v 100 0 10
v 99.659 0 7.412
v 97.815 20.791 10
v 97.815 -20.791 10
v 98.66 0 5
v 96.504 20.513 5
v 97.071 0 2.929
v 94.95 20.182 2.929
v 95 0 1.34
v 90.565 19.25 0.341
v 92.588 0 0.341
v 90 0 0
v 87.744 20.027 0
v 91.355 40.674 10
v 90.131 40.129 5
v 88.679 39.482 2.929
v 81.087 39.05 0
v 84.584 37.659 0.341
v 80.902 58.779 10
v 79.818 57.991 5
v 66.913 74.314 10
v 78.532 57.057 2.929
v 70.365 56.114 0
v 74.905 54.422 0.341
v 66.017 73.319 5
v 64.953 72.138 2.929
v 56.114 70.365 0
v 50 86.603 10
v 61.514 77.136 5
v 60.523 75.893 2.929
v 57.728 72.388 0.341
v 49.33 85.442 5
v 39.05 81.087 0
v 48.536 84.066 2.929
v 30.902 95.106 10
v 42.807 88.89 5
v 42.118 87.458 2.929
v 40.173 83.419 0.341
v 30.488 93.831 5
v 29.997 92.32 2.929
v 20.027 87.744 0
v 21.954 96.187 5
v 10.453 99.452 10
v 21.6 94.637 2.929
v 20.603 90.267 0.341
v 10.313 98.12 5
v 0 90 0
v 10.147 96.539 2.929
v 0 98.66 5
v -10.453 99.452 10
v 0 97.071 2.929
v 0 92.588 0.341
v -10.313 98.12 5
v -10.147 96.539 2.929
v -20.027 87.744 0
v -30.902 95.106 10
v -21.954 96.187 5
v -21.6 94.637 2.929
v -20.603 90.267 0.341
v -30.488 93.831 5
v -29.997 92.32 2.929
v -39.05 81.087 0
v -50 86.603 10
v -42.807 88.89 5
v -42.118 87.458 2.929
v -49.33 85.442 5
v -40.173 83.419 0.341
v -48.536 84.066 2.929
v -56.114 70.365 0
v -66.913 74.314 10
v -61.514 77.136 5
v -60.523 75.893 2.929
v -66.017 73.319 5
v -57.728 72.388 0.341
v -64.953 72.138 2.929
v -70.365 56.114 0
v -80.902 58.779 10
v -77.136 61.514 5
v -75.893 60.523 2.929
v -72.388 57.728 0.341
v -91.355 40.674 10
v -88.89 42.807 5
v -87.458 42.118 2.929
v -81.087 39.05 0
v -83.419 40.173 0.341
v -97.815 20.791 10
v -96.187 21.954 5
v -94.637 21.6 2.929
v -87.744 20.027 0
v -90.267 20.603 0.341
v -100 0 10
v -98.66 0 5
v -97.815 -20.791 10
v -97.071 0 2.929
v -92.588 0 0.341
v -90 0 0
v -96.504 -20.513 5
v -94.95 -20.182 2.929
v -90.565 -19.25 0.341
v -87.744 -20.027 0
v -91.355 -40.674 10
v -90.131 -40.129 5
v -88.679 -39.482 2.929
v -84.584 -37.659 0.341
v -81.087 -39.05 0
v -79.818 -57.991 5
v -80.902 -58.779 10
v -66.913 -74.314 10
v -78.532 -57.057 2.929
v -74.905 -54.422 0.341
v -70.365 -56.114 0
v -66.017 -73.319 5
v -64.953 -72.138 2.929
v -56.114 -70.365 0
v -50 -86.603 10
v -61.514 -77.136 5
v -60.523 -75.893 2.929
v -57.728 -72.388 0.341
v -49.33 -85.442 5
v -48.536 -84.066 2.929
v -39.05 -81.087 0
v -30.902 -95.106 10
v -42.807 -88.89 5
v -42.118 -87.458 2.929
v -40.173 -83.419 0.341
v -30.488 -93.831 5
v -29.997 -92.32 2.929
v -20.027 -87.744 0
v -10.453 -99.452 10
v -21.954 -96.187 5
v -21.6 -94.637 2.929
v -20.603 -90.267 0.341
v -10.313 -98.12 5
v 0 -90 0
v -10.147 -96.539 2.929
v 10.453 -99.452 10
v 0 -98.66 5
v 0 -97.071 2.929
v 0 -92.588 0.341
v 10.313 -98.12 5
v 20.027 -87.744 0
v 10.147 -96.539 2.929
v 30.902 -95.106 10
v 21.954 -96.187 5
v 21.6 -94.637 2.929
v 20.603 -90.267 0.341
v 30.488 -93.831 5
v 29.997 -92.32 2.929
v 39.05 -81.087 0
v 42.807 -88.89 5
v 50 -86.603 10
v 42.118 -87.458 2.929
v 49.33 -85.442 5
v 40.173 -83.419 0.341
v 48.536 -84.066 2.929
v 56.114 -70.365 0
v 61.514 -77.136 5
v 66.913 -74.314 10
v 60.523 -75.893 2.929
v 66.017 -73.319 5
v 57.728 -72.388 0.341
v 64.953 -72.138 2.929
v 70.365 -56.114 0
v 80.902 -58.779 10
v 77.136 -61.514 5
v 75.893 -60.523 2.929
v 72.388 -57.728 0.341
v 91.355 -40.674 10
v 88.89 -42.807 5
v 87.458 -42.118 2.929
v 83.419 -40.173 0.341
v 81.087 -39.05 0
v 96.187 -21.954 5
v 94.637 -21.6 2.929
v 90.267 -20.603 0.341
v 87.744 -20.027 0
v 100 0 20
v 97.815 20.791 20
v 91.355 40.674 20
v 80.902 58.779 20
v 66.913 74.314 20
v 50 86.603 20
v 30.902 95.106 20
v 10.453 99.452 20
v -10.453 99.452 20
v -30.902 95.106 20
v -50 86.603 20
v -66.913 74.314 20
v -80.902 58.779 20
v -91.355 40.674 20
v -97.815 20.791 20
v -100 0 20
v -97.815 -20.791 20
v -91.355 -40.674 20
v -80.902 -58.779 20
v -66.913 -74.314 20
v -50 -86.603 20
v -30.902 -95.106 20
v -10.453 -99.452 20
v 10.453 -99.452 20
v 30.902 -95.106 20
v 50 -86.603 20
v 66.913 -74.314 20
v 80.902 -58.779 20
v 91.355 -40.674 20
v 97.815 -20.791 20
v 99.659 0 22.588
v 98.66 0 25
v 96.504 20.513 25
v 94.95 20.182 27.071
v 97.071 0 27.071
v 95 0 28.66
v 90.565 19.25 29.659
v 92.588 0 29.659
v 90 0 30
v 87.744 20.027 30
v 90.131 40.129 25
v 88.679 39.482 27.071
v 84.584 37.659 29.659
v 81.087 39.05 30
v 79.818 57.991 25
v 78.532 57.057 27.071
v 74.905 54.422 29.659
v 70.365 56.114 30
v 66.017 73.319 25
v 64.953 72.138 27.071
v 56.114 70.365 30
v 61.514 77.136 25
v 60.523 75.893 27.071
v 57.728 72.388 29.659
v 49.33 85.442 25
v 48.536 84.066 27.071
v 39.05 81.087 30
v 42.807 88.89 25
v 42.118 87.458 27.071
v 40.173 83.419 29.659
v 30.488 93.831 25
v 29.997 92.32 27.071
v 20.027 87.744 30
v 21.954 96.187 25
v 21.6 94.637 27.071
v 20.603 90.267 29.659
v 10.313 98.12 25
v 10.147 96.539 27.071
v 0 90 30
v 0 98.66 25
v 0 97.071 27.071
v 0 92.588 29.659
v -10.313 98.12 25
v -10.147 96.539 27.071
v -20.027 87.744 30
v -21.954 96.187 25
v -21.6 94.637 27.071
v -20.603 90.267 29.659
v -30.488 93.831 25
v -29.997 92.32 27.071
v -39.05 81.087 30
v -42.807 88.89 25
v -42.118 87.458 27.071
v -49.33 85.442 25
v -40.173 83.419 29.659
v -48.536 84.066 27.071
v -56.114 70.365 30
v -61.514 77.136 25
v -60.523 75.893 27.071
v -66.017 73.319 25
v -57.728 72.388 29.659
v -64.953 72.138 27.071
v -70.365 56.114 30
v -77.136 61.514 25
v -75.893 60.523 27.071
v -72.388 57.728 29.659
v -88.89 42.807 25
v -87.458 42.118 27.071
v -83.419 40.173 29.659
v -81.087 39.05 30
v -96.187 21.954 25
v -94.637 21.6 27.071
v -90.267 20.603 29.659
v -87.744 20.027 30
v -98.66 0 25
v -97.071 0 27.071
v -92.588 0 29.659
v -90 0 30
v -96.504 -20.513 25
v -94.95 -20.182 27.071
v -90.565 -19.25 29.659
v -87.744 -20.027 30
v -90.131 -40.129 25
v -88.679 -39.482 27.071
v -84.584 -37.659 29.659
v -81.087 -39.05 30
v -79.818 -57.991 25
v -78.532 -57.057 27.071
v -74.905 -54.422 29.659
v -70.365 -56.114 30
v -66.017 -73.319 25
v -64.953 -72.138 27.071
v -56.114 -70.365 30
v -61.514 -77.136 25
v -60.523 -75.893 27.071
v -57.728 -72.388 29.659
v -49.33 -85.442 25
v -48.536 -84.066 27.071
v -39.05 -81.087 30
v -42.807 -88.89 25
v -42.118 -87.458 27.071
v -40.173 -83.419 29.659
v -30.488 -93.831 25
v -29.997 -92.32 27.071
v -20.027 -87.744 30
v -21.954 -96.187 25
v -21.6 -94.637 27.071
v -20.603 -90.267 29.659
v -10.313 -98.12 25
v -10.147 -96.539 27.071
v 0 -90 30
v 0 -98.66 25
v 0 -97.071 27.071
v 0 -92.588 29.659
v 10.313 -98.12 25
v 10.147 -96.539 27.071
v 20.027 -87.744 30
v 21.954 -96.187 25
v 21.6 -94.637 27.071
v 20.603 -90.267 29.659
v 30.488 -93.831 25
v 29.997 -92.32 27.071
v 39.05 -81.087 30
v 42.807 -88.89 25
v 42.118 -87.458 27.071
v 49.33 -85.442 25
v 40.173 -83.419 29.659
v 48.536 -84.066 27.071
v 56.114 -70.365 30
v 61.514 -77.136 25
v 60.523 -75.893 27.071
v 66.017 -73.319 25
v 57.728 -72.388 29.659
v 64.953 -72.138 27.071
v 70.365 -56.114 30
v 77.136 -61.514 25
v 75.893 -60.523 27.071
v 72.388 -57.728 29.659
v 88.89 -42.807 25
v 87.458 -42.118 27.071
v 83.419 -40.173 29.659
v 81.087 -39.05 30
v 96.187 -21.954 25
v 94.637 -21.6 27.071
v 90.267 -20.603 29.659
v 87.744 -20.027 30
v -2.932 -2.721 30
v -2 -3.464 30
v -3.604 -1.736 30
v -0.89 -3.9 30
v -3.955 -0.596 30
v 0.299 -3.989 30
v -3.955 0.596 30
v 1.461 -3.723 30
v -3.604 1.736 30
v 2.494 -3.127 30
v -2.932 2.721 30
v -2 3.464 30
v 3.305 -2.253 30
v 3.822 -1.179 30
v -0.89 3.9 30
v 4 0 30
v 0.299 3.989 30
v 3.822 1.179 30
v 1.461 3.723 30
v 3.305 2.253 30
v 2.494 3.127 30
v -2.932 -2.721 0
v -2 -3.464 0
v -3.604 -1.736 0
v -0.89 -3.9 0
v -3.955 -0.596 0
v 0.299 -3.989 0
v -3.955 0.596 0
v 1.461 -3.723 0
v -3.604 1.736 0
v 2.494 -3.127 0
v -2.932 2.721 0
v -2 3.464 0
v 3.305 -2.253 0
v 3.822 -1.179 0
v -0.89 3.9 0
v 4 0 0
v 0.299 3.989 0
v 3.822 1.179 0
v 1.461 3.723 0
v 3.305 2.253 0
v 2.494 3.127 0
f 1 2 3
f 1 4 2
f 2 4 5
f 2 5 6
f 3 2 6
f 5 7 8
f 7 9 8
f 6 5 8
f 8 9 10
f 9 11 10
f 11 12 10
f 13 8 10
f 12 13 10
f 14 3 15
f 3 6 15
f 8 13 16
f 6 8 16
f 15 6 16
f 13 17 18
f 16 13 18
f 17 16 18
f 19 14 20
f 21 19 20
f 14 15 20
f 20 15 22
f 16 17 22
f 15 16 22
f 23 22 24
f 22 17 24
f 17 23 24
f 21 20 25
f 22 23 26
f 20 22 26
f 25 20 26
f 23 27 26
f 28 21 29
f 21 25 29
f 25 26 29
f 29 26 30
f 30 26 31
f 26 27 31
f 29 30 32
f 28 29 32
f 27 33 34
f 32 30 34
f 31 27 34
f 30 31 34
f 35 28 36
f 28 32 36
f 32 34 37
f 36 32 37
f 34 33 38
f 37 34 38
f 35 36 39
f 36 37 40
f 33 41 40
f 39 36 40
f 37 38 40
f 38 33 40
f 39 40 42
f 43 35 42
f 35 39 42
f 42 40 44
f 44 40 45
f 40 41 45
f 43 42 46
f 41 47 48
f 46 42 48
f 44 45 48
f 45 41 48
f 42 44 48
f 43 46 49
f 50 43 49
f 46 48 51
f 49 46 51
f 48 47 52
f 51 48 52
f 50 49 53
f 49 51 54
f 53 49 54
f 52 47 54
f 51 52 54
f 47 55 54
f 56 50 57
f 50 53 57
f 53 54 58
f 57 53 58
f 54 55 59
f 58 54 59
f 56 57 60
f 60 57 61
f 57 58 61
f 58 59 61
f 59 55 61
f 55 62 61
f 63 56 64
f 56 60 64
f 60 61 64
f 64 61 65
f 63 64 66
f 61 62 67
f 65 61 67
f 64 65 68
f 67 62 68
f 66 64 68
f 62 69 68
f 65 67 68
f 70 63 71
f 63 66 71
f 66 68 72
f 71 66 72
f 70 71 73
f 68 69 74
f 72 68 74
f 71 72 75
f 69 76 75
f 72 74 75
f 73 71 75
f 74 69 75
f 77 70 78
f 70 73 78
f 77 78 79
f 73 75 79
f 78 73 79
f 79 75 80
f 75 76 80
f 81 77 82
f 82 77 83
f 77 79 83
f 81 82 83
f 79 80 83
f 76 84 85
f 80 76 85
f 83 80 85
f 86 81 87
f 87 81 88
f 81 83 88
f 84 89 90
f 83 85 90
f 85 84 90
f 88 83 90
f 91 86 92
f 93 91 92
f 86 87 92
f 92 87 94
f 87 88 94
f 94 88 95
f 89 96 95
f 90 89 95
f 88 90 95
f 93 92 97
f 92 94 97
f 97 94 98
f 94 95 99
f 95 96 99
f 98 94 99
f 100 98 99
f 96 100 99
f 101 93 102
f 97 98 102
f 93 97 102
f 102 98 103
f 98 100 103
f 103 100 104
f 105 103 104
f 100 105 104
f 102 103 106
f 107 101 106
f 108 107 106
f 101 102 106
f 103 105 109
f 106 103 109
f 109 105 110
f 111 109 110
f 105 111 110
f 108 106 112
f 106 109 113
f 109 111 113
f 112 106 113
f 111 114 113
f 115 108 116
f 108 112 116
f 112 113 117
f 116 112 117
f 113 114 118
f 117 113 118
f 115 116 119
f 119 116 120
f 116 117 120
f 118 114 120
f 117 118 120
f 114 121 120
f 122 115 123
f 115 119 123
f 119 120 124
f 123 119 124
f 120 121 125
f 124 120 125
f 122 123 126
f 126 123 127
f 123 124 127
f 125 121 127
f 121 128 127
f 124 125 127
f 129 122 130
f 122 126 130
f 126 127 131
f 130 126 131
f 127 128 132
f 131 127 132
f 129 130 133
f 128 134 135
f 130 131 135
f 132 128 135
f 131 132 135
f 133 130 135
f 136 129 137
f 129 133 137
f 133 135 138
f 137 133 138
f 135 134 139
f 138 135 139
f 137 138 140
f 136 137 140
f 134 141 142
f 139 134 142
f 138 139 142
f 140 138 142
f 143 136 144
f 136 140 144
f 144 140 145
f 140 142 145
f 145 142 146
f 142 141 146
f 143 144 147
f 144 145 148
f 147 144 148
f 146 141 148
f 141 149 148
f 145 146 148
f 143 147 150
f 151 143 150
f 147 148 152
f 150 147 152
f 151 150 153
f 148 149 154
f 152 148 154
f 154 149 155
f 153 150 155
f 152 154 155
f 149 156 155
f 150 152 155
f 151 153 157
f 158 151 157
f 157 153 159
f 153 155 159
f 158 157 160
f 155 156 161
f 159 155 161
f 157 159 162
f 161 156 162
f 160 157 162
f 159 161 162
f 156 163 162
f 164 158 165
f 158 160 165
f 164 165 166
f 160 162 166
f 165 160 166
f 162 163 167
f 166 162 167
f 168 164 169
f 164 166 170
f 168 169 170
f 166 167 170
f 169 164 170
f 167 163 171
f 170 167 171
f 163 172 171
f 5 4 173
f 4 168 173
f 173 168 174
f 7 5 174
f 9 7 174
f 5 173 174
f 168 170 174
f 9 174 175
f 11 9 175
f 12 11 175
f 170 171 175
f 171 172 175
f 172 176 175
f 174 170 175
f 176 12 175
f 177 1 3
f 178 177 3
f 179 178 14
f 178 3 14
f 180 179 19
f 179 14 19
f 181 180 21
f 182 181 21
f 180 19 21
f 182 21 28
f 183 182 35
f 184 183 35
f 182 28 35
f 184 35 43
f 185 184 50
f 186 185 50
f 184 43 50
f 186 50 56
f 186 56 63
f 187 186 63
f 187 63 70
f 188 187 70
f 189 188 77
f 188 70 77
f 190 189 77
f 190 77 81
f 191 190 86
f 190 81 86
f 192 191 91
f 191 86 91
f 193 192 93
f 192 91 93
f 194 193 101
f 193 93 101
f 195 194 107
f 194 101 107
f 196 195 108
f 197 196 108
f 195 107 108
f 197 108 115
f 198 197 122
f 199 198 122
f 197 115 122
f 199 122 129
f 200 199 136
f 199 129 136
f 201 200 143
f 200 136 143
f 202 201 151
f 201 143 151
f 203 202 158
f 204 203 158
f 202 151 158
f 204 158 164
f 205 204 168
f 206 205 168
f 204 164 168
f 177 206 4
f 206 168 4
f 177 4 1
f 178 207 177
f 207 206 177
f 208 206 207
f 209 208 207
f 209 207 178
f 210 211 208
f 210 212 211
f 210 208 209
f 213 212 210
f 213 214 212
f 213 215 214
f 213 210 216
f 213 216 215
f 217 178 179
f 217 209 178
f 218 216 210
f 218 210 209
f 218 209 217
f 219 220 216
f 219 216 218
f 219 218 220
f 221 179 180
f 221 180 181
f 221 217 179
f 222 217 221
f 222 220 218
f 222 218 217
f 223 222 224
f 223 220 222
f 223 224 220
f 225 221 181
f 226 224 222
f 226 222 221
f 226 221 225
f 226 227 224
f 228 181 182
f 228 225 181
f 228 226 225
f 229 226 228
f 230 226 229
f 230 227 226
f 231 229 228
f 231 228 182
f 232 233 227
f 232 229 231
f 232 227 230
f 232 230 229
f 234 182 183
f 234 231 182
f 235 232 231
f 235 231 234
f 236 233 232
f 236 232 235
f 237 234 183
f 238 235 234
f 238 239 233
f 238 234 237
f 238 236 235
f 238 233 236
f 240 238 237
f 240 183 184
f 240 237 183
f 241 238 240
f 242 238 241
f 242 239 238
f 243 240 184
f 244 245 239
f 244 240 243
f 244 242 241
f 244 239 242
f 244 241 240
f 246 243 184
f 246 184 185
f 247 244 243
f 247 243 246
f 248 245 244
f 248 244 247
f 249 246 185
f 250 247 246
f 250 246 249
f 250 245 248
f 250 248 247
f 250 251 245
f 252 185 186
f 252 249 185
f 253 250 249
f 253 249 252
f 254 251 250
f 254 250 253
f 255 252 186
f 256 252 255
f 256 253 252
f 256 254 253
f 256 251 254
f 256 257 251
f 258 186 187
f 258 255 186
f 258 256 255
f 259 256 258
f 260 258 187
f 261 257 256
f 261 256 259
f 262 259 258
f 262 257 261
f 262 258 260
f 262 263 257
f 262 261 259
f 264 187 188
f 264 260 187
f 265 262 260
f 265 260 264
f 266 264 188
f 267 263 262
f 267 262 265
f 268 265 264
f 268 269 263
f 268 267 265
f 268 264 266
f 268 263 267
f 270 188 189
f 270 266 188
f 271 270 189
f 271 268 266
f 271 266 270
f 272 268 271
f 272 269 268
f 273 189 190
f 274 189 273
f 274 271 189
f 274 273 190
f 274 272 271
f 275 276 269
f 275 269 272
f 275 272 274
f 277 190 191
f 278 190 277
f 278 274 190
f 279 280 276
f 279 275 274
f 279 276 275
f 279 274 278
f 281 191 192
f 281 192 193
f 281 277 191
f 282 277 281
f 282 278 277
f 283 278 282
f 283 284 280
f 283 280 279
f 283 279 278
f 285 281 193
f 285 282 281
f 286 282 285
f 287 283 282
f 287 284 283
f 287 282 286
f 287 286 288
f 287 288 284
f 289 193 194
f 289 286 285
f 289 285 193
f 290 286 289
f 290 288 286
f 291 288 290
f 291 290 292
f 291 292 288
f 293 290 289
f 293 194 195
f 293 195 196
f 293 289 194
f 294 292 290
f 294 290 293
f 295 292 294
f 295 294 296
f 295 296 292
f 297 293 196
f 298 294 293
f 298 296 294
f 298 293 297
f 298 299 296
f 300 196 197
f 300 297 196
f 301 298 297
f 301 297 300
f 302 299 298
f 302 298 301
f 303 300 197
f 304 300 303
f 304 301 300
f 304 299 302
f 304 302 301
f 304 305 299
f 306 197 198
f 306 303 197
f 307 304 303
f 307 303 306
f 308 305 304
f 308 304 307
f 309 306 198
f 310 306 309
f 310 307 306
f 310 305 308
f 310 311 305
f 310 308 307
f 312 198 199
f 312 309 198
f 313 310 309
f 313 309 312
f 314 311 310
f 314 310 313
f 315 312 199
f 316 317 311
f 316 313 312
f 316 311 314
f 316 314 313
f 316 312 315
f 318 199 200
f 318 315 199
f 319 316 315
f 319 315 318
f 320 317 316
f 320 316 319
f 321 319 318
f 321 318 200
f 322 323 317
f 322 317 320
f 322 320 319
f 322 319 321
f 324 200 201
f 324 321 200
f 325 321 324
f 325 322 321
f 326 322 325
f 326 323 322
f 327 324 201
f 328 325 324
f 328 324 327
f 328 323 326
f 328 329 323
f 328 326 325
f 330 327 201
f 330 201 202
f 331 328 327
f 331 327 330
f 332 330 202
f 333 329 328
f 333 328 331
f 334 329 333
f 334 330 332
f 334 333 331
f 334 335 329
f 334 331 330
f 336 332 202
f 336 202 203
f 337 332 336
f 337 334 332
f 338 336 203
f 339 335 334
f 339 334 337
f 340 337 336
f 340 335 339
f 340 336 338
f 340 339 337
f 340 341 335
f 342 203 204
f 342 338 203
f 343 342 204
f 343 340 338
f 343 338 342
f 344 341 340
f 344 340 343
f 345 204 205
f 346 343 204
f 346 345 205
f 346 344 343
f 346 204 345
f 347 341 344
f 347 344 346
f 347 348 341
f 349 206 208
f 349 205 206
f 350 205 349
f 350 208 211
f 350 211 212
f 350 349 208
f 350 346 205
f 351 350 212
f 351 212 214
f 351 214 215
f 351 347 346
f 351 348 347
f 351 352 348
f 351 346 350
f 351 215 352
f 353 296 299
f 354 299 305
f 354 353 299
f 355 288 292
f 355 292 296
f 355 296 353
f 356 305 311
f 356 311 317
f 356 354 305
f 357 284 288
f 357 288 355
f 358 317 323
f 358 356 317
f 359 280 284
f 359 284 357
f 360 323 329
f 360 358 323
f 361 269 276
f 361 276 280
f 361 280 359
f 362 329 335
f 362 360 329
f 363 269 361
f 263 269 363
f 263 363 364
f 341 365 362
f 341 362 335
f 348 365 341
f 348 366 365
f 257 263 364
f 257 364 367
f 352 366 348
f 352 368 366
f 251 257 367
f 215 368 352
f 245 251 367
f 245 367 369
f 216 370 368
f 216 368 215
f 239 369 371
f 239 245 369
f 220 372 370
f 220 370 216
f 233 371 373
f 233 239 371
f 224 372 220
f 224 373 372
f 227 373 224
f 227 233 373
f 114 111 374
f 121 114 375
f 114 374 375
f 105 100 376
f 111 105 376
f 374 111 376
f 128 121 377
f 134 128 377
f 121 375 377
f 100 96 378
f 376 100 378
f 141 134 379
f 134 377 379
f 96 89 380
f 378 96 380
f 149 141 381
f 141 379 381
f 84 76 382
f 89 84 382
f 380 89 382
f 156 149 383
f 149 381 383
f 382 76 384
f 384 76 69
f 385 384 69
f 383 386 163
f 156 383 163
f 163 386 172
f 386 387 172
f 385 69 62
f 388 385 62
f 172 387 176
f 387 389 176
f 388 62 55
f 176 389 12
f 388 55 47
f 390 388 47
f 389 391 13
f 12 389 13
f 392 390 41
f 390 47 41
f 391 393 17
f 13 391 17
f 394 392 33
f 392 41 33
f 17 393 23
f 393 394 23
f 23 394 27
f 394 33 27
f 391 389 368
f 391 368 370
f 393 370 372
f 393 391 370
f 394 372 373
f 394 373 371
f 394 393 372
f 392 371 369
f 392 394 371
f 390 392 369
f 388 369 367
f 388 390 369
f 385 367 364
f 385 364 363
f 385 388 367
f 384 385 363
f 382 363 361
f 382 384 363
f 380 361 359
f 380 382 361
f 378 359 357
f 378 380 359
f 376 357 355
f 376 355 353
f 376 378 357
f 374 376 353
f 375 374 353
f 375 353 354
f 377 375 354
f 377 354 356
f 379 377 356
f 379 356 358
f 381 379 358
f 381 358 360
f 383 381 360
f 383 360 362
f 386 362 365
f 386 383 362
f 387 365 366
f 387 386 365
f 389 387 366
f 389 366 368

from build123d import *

# Parameters (mm, degrees)
CROQUIS1_R              = 100
CROQUIS1_R_2            = 4
SALIENTE_EXTRUIR1_DEPTH = 30
REDONDEO1_R             = 10
REDONDEO2_R             = 10


with BuildPart() as part:
    # Croquis1 → Saliente-Extruir1 (new body)
    with BuildSketch(Plane.XY):
        Circle(CROQUIS1_R)
        Circle(CROQUIS1_R_2, mode=Mode.SUBTRACT)
    extrude(amount=SALIENTE_EXTRUIR1_DEPTH)

    # Redondeo1
    redondeo1_edges = [part.edges().sort_by_distance(p)[0] for p in [
        (-100, 0, 30),
    ]]
    fillet(redondeo1_edges, radius=REDONDEO1_R)

    # Redondeo2
    redondeo2_edges = [part.edges().sort_by_distance(p)[0] for p in [
        (-100, 0, 0),
    ]]
    fillet(redondeo2_edges, radius=REDONDEO2_R)


solid = part.part
